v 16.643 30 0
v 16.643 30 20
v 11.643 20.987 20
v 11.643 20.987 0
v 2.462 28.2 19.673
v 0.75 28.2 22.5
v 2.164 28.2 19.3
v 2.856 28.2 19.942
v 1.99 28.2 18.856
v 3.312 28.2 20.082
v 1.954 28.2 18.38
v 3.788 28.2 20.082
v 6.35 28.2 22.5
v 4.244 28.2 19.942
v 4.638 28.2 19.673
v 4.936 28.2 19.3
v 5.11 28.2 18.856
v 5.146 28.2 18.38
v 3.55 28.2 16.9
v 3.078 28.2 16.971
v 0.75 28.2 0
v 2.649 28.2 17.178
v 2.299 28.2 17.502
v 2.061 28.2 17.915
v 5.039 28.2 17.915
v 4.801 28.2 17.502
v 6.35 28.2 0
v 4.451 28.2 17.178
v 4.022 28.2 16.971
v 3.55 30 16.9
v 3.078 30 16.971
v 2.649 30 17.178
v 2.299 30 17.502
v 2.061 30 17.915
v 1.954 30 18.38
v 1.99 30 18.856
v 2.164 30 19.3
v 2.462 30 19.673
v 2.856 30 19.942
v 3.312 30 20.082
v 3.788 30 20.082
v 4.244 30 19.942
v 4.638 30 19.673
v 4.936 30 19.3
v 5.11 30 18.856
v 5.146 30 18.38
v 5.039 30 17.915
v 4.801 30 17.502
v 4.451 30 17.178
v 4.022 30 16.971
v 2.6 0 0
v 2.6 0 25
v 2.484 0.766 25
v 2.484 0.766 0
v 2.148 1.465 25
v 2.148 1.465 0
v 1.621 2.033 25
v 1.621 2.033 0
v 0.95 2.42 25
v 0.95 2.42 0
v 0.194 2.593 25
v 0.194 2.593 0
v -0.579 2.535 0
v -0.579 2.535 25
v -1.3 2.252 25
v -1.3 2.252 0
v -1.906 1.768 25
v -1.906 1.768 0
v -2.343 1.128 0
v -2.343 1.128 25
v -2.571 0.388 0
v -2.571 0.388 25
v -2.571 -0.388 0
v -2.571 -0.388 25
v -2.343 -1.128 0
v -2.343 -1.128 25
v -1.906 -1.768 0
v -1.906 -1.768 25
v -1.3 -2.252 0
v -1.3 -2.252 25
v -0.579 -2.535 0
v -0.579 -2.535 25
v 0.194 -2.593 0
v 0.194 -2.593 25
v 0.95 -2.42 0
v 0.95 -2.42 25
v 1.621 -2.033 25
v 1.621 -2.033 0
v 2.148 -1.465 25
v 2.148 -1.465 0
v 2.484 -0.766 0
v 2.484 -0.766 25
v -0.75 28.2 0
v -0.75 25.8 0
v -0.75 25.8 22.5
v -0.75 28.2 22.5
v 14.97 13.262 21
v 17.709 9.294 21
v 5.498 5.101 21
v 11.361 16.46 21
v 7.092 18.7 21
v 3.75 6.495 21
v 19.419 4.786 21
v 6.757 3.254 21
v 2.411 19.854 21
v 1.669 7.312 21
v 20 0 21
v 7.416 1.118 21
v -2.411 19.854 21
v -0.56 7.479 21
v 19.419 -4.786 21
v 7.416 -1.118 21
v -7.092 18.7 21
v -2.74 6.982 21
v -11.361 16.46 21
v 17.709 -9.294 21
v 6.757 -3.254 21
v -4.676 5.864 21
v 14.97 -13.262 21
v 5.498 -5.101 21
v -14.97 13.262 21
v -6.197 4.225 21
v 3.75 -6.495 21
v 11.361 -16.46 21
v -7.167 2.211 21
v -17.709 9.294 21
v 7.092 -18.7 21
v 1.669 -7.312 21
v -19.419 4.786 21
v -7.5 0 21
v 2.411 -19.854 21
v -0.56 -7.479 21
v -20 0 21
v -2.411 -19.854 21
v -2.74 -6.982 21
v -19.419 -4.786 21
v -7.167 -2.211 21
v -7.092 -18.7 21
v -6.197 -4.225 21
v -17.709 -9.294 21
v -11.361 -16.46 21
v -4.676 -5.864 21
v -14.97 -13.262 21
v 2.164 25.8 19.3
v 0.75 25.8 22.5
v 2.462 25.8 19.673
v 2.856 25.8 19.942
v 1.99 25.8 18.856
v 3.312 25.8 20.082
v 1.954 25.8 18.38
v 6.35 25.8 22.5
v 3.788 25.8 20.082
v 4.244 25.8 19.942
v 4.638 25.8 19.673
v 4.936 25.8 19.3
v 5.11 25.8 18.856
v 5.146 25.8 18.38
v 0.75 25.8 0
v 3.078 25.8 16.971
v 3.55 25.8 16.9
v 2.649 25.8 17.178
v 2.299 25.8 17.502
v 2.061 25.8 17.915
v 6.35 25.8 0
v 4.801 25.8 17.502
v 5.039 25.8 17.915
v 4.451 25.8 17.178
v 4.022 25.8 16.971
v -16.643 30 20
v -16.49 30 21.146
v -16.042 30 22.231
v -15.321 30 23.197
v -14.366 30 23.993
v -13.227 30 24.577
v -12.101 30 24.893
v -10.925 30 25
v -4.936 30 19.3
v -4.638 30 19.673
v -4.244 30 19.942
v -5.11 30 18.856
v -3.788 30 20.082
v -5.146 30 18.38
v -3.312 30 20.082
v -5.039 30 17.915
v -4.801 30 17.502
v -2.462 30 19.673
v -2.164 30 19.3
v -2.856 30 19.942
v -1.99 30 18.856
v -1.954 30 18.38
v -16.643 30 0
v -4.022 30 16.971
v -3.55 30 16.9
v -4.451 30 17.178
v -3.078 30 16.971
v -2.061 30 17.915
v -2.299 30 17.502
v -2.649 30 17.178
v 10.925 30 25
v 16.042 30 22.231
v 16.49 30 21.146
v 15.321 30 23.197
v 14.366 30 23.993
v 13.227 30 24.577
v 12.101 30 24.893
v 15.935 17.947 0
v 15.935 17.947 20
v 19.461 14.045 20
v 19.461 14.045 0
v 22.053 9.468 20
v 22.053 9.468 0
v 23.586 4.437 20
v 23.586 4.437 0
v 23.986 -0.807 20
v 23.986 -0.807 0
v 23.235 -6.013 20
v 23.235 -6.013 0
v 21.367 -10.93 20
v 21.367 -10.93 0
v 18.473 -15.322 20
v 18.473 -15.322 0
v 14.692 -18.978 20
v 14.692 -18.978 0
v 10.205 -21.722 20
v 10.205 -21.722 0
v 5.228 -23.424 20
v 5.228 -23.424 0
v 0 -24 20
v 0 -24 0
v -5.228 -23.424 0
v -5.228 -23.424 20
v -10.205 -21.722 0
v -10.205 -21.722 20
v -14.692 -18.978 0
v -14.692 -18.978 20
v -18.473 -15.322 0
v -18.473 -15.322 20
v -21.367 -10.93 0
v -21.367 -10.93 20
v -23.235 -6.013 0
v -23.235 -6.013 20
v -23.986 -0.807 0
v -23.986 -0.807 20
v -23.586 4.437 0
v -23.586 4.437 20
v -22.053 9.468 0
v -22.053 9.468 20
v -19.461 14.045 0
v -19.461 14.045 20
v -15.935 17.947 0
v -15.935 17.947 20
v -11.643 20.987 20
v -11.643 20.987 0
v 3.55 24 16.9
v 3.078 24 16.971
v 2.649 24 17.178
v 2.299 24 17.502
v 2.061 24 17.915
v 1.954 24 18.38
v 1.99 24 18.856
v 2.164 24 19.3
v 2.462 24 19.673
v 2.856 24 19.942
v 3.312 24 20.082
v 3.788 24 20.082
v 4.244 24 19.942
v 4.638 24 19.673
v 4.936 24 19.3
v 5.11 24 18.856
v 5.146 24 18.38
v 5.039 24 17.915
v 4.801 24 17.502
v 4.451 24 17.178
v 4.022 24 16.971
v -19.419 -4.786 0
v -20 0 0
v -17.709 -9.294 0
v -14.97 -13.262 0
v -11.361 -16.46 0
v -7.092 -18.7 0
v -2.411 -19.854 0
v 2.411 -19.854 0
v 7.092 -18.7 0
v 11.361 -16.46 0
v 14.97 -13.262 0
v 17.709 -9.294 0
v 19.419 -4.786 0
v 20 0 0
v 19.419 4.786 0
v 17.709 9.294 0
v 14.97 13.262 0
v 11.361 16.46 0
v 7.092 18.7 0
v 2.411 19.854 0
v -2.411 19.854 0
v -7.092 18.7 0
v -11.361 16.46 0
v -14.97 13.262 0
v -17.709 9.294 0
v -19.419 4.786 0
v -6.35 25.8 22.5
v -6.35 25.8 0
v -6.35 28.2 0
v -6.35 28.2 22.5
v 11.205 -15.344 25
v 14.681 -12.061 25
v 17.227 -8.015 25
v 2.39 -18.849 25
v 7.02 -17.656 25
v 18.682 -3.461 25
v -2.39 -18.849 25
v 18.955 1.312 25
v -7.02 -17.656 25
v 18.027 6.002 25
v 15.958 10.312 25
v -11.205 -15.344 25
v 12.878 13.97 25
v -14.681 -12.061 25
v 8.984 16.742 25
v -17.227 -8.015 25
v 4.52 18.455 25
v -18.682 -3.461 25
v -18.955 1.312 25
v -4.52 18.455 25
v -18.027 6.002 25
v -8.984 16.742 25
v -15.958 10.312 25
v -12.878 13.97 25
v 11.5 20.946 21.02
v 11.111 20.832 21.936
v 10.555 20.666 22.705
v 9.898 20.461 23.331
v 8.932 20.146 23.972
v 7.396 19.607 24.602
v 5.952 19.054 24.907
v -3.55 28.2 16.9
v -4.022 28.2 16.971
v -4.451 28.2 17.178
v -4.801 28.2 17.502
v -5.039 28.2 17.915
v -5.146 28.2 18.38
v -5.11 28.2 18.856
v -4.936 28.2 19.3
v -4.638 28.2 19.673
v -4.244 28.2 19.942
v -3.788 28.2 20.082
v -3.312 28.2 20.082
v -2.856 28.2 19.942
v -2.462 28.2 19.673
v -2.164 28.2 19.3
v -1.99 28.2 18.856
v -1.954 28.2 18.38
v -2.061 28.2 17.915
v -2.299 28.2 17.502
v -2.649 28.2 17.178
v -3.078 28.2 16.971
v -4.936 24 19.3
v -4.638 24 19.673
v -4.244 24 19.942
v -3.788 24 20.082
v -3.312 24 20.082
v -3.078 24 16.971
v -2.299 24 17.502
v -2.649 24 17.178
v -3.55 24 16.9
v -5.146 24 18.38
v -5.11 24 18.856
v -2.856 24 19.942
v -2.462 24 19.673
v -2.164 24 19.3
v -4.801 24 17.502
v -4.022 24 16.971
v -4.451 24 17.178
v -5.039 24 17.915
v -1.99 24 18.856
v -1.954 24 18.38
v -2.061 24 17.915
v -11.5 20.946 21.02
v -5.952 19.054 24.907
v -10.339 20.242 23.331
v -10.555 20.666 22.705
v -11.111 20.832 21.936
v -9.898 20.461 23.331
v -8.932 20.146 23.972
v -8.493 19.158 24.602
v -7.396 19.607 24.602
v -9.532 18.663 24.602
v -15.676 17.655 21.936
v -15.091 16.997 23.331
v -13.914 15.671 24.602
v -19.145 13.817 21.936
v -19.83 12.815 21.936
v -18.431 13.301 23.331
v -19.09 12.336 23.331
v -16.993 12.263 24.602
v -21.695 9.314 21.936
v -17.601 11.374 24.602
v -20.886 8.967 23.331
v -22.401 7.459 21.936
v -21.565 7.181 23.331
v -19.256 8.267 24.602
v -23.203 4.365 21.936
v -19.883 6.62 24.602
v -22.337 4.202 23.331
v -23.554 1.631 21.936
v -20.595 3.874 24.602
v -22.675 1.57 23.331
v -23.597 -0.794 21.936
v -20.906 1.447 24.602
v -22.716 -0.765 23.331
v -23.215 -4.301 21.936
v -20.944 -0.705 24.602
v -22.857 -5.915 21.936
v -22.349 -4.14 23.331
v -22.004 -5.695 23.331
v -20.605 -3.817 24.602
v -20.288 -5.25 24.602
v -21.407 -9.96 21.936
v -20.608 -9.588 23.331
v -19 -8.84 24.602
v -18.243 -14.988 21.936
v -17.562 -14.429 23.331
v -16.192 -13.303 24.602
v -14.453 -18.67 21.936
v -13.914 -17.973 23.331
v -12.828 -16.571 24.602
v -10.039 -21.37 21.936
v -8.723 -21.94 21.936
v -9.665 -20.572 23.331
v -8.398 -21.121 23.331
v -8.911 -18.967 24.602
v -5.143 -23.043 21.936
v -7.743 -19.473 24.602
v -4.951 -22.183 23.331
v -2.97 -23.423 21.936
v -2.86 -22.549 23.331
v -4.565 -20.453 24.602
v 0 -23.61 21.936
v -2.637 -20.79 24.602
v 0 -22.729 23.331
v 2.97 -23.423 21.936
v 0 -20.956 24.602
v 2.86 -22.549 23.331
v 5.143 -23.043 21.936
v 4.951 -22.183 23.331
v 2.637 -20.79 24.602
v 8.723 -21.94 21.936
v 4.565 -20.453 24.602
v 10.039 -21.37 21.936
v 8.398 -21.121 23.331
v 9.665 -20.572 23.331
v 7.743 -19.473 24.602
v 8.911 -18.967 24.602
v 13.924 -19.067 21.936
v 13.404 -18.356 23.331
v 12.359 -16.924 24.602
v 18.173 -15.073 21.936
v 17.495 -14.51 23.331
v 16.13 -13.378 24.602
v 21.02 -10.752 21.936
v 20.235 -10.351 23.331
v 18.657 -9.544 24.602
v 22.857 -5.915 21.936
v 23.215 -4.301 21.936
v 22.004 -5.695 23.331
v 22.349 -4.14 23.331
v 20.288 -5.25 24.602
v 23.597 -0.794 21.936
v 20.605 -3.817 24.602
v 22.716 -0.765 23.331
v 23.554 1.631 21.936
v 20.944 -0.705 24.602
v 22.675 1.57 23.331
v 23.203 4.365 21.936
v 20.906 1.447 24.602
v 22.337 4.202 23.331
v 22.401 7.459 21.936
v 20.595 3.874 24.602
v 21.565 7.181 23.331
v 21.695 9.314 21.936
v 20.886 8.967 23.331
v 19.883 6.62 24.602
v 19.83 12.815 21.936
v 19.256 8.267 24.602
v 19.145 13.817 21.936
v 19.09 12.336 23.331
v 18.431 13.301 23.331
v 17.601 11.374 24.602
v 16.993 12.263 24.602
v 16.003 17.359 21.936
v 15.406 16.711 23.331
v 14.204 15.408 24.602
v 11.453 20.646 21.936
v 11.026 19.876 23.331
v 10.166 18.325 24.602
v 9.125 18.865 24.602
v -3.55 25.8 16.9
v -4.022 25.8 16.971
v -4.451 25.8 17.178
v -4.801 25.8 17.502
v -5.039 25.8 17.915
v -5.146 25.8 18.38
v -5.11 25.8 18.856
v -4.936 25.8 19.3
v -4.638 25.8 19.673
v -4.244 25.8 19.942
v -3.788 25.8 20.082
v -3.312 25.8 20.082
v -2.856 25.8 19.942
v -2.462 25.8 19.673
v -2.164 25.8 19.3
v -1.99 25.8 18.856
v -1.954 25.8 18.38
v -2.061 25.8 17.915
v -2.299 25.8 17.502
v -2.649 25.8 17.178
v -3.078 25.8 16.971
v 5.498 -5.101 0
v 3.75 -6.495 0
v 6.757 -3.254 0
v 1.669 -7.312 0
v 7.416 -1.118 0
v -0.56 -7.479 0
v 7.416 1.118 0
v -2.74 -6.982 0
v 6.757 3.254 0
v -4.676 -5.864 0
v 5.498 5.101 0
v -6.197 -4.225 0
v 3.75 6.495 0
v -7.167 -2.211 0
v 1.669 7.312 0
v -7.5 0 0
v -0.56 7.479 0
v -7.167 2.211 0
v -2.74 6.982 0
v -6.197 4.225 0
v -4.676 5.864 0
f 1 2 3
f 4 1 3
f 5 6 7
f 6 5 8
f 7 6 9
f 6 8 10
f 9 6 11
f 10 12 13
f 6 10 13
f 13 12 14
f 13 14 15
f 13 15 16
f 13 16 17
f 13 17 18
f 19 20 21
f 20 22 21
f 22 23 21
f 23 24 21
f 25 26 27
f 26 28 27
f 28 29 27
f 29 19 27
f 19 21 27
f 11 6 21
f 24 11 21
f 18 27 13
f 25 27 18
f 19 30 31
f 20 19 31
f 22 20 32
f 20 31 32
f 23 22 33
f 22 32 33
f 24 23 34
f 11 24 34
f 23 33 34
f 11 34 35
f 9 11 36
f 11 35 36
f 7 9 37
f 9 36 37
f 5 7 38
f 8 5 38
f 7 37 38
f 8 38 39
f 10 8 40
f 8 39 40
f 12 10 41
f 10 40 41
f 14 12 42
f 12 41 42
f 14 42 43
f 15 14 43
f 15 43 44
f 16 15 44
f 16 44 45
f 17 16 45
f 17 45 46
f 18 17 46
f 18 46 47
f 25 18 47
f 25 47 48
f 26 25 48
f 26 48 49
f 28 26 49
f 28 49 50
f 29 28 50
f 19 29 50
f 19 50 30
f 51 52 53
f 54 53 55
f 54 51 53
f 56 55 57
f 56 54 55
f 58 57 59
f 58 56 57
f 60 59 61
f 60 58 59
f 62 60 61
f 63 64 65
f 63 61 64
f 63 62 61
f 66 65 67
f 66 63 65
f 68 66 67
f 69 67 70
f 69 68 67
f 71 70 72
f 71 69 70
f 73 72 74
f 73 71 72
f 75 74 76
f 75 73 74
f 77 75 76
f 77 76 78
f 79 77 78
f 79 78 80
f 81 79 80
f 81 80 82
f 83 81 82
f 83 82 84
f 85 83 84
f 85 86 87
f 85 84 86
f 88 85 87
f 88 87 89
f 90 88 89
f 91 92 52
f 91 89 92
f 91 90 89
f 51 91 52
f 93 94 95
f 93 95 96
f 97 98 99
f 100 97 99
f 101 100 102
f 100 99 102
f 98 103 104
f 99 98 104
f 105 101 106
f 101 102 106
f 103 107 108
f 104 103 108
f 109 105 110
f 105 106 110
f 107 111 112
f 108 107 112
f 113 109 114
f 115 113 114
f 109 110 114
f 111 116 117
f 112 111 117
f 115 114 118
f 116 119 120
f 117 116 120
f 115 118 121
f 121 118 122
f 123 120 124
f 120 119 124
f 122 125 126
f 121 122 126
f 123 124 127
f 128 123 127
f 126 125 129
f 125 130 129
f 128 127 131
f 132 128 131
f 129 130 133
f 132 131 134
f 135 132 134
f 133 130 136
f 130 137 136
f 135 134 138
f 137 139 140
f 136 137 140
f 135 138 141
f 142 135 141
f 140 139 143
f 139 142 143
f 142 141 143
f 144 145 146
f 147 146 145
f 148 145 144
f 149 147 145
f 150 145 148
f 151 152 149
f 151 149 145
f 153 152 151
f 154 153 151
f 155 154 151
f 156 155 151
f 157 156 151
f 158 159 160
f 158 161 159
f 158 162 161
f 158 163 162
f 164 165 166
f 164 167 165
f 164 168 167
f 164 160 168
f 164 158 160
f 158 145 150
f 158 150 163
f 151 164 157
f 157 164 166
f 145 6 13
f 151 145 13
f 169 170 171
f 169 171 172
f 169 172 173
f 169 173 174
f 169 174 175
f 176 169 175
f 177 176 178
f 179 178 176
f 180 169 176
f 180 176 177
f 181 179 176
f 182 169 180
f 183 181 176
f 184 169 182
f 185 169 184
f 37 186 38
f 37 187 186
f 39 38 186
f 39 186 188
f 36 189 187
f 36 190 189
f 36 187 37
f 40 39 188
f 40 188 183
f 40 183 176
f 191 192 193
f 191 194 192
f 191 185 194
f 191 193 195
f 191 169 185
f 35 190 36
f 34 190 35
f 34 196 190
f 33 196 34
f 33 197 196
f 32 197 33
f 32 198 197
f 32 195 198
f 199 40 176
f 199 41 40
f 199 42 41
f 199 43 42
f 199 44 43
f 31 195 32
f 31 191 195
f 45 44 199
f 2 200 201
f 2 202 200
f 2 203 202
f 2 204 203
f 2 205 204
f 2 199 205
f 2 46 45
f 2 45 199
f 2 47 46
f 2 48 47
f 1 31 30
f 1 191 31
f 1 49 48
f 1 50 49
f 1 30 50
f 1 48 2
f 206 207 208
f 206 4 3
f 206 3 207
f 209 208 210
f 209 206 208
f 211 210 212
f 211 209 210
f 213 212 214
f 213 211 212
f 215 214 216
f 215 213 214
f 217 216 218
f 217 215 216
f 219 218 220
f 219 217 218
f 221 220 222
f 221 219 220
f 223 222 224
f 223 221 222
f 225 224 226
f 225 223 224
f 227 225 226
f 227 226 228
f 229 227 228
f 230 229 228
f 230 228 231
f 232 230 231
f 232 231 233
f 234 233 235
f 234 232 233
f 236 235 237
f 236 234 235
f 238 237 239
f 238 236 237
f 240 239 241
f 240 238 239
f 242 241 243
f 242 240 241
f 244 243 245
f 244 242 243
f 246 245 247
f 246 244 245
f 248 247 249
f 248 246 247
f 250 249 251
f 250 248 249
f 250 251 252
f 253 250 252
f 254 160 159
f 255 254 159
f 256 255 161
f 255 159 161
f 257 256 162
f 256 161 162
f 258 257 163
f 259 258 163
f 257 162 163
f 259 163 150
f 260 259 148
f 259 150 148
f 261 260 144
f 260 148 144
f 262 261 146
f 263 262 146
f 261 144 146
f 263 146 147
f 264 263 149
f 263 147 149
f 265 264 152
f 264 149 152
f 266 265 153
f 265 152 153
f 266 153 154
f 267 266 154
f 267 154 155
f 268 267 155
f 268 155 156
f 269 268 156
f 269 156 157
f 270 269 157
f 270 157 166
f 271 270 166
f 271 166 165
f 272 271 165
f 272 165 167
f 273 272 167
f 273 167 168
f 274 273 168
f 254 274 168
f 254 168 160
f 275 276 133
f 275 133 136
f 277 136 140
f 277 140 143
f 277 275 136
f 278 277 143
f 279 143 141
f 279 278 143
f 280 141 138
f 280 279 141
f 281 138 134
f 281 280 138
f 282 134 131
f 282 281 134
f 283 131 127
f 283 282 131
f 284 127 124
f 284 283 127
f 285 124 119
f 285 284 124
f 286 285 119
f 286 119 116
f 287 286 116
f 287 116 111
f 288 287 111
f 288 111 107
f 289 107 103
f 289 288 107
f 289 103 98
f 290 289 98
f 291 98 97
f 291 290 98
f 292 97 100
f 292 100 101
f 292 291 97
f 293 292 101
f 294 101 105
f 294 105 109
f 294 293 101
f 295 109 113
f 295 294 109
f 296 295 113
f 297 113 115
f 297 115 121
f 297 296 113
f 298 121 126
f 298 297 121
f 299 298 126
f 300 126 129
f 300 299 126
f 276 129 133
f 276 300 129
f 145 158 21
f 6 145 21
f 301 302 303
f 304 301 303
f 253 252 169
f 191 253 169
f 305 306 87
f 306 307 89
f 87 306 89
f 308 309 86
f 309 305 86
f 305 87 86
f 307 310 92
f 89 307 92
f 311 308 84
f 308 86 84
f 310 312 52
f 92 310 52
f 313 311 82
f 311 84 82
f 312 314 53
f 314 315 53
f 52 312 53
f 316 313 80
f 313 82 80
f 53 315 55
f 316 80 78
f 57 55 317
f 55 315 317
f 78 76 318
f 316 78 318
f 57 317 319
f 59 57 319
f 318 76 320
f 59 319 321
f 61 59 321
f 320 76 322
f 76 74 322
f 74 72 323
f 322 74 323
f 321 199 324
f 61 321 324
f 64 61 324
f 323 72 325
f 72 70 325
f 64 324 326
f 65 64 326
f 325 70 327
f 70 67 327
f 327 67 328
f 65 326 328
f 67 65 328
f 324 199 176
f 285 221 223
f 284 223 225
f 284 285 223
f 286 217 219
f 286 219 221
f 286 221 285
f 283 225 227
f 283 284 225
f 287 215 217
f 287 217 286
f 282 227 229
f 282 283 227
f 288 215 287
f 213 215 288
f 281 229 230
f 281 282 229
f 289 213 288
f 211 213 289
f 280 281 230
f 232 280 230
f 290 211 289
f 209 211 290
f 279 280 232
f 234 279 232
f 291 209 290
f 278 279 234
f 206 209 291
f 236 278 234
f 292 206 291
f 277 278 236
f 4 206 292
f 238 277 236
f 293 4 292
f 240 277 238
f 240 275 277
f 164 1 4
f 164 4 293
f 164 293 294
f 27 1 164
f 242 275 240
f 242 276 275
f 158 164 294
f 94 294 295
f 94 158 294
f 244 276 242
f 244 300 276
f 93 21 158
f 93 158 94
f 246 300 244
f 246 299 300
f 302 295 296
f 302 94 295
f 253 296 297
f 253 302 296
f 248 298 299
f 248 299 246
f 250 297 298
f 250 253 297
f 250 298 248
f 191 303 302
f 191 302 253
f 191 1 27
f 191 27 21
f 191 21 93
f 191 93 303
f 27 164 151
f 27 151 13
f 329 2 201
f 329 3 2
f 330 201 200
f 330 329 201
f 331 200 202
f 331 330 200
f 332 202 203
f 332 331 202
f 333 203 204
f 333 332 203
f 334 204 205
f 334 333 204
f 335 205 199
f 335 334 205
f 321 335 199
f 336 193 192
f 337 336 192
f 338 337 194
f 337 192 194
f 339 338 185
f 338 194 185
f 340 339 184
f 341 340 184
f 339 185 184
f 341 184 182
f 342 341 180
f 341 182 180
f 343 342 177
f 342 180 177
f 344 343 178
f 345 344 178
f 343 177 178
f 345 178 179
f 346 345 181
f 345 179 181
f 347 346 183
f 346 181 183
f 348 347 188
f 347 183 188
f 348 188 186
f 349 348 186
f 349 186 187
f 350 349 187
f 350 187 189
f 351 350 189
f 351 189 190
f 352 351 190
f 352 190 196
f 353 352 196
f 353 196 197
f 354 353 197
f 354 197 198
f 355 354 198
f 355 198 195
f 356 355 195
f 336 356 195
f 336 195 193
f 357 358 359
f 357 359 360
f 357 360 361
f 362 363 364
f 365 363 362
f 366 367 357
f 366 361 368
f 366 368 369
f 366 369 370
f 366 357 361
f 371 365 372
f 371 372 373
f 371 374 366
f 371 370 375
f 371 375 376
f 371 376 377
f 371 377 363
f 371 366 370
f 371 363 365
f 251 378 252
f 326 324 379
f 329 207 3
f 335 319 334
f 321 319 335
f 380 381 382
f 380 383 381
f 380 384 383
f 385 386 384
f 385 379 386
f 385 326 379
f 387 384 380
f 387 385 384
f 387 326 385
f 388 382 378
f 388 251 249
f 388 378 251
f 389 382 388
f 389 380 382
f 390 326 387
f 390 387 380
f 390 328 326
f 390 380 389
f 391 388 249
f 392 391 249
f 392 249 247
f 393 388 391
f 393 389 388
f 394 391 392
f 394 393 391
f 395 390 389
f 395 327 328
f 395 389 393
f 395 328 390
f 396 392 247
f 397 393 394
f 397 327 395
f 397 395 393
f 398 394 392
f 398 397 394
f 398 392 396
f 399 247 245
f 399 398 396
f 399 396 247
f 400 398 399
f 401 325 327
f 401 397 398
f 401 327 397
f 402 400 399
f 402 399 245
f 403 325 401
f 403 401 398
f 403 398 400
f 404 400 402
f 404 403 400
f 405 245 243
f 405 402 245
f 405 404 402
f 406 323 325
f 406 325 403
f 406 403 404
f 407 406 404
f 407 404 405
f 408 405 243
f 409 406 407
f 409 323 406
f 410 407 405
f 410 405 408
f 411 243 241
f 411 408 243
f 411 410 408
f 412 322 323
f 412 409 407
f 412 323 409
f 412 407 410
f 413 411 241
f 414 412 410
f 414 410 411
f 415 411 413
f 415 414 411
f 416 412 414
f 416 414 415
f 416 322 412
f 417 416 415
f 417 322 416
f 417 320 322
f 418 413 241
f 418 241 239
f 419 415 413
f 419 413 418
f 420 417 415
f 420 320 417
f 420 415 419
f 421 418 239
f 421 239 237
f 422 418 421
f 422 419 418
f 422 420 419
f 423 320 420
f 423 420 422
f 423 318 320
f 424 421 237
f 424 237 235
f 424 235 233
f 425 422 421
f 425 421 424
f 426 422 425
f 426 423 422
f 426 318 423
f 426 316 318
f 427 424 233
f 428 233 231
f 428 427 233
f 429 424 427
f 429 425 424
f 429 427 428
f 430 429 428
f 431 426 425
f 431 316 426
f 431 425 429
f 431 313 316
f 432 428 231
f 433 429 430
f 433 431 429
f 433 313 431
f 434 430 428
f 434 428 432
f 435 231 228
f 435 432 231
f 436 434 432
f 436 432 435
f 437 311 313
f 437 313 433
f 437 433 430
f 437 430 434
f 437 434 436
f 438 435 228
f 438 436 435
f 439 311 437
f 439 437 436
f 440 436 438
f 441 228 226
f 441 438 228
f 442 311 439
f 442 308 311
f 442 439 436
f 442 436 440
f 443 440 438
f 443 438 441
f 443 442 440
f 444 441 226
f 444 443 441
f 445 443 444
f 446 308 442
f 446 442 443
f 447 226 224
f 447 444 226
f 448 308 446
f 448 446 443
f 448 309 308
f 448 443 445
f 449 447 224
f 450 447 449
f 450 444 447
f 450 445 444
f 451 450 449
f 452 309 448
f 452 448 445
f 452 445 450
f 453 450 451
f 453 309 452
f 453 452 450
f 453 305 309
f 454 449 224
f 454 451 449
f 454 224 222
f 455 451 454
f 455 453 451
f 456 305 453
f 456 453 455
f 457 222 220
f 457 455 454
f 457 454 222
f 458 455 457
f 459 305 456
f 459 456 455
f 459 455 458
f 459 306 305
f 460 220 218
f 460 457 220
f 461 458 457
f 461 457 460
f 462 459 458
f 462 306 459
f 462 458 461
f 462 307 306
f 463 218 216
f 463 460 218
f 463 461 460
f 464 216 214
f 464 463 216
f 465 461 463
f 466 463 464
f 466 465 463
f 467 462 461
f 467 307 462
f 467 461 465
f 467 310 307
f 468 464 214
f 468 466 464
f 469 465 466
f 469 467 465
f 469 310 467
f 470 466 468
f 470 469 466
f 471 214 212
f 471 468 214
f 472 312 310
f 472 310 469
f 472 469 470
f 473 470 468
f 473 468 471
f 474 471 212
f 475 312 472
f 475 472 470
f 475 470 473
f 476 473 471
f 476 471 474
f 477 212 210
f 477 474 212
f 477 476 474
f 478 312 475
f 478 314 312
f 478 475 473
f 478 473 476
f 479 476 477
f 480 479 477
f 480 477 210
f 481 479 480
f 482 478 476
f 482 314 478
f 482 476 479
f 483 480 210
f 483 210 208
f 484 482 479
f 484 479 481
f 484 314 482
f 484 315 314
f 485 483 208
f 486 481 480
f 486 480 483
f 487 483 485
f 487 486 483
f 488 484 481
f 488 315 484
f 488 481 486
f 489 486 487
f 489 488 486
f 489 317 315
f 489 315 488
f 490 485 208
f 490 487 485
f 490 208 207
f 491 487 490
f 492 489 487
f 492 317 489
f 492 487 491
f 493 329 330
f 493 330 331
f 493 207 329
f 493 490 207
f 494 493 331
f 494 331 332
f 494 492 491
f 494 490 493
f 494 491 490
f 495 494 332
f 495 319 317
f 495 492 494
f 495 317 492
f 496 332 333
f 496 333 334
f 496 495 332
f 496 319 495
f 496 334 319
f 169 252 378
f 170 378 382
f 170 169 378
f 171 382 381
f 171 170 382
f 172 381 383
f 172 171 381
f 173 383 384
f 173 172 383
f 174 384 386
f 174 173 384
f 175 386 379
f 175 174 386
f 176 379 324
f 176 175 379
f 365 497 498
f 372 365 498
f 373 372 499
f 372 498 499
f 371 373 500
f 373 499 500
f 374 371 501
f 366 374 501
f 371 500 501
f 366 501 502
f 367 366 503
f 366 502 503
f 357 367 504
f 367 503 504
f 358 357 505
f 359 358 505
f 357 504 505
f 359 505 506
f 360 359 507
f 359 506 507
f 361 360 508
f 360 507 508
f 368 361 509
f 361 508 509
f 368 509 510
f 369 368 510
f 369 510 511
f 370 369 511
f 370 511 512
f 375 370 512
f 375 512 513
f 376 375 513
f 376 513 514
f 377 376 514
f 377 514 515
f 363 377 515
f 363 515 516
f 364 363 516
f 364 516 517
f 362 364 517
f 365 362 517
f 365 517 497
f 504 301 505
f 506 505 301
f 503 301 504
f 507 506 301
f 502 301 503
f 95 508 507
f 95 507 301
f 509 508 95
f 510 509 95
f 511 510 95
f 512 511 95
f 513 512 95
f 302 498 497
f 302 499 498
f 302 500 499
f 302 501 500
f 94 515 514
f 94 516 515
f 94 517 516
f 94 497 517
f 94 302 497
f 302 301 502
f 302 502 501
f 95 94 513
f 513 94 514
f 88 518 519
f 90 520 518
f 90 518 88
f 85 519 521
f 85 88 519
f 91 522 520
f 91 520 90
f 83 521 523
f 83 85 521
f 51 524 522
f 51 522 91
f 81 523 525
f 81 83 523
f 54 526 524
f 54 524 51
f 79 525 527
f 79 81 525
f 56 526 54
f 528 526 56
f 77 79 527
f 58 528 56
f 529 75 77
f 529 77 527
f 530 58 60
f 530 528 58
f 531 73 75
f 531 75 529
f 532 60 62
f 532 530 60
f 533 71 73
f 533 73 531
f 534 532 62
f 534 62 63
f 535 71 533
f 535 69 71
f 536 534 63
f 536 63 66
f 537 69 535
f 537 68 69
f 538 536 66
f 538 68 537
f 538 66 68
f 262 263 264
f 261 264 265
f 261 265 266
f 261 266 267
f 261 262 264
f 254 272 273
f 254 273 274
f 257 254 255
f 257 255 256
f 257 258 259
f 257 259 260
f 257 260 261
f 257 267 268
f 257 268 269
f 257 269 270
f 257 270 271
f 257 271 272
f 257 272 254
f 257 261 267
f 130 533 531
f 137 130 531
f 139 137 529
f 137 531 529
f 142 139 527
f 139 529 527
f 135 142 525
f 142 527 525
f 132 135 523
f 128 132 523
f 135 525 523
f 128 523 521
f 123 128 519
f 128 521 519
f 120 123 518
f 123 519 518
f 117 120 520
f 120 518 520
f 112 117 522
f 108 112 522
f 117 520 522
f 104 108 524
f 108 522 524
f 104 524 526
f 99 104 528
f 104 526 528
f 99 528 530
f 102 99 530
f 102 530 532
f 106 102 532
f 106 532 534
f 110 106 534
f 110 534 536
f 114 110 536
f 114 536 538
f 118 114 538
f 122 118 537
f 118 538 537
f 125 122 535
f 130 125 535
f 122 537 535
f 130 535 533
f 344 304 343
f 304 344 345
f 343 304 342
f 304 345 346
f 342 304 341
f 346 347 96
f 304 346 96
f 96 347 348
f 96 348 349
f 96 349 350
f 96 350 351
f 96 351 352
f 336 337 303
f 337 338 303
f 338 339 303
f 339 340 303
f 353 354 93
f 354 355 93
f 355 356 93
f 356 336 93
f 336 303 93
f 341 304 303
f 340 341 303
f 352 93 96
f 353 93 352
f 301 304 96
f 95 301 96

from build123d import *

# Parameters (mm, degrees)
BOSS_EXTRUDE1_DEPTH = 25
FILLET1_R           = 5
SKETCH2_R           = 2.6
CUT_EXTRUDE1_DEPTH  = 46.836666718
SKETCH4_R           = 20
SKETCH4_R_2         = 7.5
CUT_EXTRUDE2_DEPTH  = 21
CUT_EXTRUDE3_START  = 30
SKETCH5_R           = 1.6
CUT_EXTRUDE3_DEPTH  = 6
SKETCH6_W           = 5.6
SKETCH6_H           = 2.4
CUT_EXTRUDE4_DEPTH  = 22.5


with BuildPart() as part:
    # Sketch1 → Boss-Extrude1 (new body)
    with BuildSketch(Plane.XY):
        with BuildLine():
            Line((-16.642519968, 30), (16.642519968, 30))
            Line((16.642519968, 30), (11.642519968, 20.986941864))
            ThreePointArc((11.642519968, 20.986941864), (0, -24), (-11.642519968, 20.986941864))
            Line((-11.642519968, 20.986941864), (-16.642519968, 30))
        make_face()
    extrude(amount=BOSS_EXTRUDE1_DEPTH)

    # Fillet1
    fillet1_edges = [part.edges().sort_by_distance(p)[0] for p in [
        (-14.142519968, 25.493470932, 25),
    ]]
    fillet(fillet1_edges, radius=FILLET1_R)
    fillet1_2_edges = [part.edges().sort_by_distance(p)[0] for p in [
        (14.142519968, 25.493470932, 25),
    ]]
    fillet(fillet1_2_edges, radius=FILLET1_R)
    fillet1_3_edges = [part.edges().sort_by_distance(p)[0] for p in [
        (0, -24, 25),
    ]]
    fillet(fillet1_3_edges, radius=FILLET1_R - 0.0001)  # a hair under: the kernel refuses the full size

    # Sketch2 → Cut-Extrude1 (cut, through all)
    with BuildSketch(Plane.XY):
        Circle(SKETCH2_R)
    extrude(amount=CUT_EXTRUDE1_DEPTH, mode=Mode.SUBTRACT)

    # Sketch4 → Cut-Extrude2 (cut)
    with BuildSketch(Plane.XY):
        with Locations(Location((0, 0, 0), (0, 0, 180))):
            Circle(SKETCH4_R)
        with Locations(Location((0, 0, 0), (0, 0, 180))):
            Circle(SKETCH4_R_2, mode=Mode.SUBTRACT)
    extrude(amount=CUT_EXTRUDE2_DEPTH, mode=Mode.SUBTRACT)

    # Sketch5 → Cut-Extrude3 (cut)
    with BuildSketch(Plane(origin=(0, 0, 0), x_dir=(1, 0, 0), z_dir=(0, 1, 0)).offset(CUT_EXTRUDE3_START)):
        with Locations(Location((-3.55, -18.5, 0), (0, 0, 90))):
            Circle(SKETCH5_R)
        with Locations(Location((3.55, -18.5, 0), (0, 0, 90))):
            Circle(SKETCH5_R)
    extrude(amount=-CUT_EXTRUDE3_DEPTH, mode=Mode.SUBTRACT)

    # Sketch6 → Cut-Extrude4 (cut)
    with BuildSketch(Plane.XY):
        with Locations((3.55, 27)):
            Rectangle(SKETCH6_W, SKETCH6_H)
        with Locations((-3.55, 27)):
            Rectangle(SKETCH6_W, SKETCH6_H)
    extrude(amount=CUT_EXTRUDE4_DEPTH, mode=Mode.SUBTRACT)


solid = part.part
